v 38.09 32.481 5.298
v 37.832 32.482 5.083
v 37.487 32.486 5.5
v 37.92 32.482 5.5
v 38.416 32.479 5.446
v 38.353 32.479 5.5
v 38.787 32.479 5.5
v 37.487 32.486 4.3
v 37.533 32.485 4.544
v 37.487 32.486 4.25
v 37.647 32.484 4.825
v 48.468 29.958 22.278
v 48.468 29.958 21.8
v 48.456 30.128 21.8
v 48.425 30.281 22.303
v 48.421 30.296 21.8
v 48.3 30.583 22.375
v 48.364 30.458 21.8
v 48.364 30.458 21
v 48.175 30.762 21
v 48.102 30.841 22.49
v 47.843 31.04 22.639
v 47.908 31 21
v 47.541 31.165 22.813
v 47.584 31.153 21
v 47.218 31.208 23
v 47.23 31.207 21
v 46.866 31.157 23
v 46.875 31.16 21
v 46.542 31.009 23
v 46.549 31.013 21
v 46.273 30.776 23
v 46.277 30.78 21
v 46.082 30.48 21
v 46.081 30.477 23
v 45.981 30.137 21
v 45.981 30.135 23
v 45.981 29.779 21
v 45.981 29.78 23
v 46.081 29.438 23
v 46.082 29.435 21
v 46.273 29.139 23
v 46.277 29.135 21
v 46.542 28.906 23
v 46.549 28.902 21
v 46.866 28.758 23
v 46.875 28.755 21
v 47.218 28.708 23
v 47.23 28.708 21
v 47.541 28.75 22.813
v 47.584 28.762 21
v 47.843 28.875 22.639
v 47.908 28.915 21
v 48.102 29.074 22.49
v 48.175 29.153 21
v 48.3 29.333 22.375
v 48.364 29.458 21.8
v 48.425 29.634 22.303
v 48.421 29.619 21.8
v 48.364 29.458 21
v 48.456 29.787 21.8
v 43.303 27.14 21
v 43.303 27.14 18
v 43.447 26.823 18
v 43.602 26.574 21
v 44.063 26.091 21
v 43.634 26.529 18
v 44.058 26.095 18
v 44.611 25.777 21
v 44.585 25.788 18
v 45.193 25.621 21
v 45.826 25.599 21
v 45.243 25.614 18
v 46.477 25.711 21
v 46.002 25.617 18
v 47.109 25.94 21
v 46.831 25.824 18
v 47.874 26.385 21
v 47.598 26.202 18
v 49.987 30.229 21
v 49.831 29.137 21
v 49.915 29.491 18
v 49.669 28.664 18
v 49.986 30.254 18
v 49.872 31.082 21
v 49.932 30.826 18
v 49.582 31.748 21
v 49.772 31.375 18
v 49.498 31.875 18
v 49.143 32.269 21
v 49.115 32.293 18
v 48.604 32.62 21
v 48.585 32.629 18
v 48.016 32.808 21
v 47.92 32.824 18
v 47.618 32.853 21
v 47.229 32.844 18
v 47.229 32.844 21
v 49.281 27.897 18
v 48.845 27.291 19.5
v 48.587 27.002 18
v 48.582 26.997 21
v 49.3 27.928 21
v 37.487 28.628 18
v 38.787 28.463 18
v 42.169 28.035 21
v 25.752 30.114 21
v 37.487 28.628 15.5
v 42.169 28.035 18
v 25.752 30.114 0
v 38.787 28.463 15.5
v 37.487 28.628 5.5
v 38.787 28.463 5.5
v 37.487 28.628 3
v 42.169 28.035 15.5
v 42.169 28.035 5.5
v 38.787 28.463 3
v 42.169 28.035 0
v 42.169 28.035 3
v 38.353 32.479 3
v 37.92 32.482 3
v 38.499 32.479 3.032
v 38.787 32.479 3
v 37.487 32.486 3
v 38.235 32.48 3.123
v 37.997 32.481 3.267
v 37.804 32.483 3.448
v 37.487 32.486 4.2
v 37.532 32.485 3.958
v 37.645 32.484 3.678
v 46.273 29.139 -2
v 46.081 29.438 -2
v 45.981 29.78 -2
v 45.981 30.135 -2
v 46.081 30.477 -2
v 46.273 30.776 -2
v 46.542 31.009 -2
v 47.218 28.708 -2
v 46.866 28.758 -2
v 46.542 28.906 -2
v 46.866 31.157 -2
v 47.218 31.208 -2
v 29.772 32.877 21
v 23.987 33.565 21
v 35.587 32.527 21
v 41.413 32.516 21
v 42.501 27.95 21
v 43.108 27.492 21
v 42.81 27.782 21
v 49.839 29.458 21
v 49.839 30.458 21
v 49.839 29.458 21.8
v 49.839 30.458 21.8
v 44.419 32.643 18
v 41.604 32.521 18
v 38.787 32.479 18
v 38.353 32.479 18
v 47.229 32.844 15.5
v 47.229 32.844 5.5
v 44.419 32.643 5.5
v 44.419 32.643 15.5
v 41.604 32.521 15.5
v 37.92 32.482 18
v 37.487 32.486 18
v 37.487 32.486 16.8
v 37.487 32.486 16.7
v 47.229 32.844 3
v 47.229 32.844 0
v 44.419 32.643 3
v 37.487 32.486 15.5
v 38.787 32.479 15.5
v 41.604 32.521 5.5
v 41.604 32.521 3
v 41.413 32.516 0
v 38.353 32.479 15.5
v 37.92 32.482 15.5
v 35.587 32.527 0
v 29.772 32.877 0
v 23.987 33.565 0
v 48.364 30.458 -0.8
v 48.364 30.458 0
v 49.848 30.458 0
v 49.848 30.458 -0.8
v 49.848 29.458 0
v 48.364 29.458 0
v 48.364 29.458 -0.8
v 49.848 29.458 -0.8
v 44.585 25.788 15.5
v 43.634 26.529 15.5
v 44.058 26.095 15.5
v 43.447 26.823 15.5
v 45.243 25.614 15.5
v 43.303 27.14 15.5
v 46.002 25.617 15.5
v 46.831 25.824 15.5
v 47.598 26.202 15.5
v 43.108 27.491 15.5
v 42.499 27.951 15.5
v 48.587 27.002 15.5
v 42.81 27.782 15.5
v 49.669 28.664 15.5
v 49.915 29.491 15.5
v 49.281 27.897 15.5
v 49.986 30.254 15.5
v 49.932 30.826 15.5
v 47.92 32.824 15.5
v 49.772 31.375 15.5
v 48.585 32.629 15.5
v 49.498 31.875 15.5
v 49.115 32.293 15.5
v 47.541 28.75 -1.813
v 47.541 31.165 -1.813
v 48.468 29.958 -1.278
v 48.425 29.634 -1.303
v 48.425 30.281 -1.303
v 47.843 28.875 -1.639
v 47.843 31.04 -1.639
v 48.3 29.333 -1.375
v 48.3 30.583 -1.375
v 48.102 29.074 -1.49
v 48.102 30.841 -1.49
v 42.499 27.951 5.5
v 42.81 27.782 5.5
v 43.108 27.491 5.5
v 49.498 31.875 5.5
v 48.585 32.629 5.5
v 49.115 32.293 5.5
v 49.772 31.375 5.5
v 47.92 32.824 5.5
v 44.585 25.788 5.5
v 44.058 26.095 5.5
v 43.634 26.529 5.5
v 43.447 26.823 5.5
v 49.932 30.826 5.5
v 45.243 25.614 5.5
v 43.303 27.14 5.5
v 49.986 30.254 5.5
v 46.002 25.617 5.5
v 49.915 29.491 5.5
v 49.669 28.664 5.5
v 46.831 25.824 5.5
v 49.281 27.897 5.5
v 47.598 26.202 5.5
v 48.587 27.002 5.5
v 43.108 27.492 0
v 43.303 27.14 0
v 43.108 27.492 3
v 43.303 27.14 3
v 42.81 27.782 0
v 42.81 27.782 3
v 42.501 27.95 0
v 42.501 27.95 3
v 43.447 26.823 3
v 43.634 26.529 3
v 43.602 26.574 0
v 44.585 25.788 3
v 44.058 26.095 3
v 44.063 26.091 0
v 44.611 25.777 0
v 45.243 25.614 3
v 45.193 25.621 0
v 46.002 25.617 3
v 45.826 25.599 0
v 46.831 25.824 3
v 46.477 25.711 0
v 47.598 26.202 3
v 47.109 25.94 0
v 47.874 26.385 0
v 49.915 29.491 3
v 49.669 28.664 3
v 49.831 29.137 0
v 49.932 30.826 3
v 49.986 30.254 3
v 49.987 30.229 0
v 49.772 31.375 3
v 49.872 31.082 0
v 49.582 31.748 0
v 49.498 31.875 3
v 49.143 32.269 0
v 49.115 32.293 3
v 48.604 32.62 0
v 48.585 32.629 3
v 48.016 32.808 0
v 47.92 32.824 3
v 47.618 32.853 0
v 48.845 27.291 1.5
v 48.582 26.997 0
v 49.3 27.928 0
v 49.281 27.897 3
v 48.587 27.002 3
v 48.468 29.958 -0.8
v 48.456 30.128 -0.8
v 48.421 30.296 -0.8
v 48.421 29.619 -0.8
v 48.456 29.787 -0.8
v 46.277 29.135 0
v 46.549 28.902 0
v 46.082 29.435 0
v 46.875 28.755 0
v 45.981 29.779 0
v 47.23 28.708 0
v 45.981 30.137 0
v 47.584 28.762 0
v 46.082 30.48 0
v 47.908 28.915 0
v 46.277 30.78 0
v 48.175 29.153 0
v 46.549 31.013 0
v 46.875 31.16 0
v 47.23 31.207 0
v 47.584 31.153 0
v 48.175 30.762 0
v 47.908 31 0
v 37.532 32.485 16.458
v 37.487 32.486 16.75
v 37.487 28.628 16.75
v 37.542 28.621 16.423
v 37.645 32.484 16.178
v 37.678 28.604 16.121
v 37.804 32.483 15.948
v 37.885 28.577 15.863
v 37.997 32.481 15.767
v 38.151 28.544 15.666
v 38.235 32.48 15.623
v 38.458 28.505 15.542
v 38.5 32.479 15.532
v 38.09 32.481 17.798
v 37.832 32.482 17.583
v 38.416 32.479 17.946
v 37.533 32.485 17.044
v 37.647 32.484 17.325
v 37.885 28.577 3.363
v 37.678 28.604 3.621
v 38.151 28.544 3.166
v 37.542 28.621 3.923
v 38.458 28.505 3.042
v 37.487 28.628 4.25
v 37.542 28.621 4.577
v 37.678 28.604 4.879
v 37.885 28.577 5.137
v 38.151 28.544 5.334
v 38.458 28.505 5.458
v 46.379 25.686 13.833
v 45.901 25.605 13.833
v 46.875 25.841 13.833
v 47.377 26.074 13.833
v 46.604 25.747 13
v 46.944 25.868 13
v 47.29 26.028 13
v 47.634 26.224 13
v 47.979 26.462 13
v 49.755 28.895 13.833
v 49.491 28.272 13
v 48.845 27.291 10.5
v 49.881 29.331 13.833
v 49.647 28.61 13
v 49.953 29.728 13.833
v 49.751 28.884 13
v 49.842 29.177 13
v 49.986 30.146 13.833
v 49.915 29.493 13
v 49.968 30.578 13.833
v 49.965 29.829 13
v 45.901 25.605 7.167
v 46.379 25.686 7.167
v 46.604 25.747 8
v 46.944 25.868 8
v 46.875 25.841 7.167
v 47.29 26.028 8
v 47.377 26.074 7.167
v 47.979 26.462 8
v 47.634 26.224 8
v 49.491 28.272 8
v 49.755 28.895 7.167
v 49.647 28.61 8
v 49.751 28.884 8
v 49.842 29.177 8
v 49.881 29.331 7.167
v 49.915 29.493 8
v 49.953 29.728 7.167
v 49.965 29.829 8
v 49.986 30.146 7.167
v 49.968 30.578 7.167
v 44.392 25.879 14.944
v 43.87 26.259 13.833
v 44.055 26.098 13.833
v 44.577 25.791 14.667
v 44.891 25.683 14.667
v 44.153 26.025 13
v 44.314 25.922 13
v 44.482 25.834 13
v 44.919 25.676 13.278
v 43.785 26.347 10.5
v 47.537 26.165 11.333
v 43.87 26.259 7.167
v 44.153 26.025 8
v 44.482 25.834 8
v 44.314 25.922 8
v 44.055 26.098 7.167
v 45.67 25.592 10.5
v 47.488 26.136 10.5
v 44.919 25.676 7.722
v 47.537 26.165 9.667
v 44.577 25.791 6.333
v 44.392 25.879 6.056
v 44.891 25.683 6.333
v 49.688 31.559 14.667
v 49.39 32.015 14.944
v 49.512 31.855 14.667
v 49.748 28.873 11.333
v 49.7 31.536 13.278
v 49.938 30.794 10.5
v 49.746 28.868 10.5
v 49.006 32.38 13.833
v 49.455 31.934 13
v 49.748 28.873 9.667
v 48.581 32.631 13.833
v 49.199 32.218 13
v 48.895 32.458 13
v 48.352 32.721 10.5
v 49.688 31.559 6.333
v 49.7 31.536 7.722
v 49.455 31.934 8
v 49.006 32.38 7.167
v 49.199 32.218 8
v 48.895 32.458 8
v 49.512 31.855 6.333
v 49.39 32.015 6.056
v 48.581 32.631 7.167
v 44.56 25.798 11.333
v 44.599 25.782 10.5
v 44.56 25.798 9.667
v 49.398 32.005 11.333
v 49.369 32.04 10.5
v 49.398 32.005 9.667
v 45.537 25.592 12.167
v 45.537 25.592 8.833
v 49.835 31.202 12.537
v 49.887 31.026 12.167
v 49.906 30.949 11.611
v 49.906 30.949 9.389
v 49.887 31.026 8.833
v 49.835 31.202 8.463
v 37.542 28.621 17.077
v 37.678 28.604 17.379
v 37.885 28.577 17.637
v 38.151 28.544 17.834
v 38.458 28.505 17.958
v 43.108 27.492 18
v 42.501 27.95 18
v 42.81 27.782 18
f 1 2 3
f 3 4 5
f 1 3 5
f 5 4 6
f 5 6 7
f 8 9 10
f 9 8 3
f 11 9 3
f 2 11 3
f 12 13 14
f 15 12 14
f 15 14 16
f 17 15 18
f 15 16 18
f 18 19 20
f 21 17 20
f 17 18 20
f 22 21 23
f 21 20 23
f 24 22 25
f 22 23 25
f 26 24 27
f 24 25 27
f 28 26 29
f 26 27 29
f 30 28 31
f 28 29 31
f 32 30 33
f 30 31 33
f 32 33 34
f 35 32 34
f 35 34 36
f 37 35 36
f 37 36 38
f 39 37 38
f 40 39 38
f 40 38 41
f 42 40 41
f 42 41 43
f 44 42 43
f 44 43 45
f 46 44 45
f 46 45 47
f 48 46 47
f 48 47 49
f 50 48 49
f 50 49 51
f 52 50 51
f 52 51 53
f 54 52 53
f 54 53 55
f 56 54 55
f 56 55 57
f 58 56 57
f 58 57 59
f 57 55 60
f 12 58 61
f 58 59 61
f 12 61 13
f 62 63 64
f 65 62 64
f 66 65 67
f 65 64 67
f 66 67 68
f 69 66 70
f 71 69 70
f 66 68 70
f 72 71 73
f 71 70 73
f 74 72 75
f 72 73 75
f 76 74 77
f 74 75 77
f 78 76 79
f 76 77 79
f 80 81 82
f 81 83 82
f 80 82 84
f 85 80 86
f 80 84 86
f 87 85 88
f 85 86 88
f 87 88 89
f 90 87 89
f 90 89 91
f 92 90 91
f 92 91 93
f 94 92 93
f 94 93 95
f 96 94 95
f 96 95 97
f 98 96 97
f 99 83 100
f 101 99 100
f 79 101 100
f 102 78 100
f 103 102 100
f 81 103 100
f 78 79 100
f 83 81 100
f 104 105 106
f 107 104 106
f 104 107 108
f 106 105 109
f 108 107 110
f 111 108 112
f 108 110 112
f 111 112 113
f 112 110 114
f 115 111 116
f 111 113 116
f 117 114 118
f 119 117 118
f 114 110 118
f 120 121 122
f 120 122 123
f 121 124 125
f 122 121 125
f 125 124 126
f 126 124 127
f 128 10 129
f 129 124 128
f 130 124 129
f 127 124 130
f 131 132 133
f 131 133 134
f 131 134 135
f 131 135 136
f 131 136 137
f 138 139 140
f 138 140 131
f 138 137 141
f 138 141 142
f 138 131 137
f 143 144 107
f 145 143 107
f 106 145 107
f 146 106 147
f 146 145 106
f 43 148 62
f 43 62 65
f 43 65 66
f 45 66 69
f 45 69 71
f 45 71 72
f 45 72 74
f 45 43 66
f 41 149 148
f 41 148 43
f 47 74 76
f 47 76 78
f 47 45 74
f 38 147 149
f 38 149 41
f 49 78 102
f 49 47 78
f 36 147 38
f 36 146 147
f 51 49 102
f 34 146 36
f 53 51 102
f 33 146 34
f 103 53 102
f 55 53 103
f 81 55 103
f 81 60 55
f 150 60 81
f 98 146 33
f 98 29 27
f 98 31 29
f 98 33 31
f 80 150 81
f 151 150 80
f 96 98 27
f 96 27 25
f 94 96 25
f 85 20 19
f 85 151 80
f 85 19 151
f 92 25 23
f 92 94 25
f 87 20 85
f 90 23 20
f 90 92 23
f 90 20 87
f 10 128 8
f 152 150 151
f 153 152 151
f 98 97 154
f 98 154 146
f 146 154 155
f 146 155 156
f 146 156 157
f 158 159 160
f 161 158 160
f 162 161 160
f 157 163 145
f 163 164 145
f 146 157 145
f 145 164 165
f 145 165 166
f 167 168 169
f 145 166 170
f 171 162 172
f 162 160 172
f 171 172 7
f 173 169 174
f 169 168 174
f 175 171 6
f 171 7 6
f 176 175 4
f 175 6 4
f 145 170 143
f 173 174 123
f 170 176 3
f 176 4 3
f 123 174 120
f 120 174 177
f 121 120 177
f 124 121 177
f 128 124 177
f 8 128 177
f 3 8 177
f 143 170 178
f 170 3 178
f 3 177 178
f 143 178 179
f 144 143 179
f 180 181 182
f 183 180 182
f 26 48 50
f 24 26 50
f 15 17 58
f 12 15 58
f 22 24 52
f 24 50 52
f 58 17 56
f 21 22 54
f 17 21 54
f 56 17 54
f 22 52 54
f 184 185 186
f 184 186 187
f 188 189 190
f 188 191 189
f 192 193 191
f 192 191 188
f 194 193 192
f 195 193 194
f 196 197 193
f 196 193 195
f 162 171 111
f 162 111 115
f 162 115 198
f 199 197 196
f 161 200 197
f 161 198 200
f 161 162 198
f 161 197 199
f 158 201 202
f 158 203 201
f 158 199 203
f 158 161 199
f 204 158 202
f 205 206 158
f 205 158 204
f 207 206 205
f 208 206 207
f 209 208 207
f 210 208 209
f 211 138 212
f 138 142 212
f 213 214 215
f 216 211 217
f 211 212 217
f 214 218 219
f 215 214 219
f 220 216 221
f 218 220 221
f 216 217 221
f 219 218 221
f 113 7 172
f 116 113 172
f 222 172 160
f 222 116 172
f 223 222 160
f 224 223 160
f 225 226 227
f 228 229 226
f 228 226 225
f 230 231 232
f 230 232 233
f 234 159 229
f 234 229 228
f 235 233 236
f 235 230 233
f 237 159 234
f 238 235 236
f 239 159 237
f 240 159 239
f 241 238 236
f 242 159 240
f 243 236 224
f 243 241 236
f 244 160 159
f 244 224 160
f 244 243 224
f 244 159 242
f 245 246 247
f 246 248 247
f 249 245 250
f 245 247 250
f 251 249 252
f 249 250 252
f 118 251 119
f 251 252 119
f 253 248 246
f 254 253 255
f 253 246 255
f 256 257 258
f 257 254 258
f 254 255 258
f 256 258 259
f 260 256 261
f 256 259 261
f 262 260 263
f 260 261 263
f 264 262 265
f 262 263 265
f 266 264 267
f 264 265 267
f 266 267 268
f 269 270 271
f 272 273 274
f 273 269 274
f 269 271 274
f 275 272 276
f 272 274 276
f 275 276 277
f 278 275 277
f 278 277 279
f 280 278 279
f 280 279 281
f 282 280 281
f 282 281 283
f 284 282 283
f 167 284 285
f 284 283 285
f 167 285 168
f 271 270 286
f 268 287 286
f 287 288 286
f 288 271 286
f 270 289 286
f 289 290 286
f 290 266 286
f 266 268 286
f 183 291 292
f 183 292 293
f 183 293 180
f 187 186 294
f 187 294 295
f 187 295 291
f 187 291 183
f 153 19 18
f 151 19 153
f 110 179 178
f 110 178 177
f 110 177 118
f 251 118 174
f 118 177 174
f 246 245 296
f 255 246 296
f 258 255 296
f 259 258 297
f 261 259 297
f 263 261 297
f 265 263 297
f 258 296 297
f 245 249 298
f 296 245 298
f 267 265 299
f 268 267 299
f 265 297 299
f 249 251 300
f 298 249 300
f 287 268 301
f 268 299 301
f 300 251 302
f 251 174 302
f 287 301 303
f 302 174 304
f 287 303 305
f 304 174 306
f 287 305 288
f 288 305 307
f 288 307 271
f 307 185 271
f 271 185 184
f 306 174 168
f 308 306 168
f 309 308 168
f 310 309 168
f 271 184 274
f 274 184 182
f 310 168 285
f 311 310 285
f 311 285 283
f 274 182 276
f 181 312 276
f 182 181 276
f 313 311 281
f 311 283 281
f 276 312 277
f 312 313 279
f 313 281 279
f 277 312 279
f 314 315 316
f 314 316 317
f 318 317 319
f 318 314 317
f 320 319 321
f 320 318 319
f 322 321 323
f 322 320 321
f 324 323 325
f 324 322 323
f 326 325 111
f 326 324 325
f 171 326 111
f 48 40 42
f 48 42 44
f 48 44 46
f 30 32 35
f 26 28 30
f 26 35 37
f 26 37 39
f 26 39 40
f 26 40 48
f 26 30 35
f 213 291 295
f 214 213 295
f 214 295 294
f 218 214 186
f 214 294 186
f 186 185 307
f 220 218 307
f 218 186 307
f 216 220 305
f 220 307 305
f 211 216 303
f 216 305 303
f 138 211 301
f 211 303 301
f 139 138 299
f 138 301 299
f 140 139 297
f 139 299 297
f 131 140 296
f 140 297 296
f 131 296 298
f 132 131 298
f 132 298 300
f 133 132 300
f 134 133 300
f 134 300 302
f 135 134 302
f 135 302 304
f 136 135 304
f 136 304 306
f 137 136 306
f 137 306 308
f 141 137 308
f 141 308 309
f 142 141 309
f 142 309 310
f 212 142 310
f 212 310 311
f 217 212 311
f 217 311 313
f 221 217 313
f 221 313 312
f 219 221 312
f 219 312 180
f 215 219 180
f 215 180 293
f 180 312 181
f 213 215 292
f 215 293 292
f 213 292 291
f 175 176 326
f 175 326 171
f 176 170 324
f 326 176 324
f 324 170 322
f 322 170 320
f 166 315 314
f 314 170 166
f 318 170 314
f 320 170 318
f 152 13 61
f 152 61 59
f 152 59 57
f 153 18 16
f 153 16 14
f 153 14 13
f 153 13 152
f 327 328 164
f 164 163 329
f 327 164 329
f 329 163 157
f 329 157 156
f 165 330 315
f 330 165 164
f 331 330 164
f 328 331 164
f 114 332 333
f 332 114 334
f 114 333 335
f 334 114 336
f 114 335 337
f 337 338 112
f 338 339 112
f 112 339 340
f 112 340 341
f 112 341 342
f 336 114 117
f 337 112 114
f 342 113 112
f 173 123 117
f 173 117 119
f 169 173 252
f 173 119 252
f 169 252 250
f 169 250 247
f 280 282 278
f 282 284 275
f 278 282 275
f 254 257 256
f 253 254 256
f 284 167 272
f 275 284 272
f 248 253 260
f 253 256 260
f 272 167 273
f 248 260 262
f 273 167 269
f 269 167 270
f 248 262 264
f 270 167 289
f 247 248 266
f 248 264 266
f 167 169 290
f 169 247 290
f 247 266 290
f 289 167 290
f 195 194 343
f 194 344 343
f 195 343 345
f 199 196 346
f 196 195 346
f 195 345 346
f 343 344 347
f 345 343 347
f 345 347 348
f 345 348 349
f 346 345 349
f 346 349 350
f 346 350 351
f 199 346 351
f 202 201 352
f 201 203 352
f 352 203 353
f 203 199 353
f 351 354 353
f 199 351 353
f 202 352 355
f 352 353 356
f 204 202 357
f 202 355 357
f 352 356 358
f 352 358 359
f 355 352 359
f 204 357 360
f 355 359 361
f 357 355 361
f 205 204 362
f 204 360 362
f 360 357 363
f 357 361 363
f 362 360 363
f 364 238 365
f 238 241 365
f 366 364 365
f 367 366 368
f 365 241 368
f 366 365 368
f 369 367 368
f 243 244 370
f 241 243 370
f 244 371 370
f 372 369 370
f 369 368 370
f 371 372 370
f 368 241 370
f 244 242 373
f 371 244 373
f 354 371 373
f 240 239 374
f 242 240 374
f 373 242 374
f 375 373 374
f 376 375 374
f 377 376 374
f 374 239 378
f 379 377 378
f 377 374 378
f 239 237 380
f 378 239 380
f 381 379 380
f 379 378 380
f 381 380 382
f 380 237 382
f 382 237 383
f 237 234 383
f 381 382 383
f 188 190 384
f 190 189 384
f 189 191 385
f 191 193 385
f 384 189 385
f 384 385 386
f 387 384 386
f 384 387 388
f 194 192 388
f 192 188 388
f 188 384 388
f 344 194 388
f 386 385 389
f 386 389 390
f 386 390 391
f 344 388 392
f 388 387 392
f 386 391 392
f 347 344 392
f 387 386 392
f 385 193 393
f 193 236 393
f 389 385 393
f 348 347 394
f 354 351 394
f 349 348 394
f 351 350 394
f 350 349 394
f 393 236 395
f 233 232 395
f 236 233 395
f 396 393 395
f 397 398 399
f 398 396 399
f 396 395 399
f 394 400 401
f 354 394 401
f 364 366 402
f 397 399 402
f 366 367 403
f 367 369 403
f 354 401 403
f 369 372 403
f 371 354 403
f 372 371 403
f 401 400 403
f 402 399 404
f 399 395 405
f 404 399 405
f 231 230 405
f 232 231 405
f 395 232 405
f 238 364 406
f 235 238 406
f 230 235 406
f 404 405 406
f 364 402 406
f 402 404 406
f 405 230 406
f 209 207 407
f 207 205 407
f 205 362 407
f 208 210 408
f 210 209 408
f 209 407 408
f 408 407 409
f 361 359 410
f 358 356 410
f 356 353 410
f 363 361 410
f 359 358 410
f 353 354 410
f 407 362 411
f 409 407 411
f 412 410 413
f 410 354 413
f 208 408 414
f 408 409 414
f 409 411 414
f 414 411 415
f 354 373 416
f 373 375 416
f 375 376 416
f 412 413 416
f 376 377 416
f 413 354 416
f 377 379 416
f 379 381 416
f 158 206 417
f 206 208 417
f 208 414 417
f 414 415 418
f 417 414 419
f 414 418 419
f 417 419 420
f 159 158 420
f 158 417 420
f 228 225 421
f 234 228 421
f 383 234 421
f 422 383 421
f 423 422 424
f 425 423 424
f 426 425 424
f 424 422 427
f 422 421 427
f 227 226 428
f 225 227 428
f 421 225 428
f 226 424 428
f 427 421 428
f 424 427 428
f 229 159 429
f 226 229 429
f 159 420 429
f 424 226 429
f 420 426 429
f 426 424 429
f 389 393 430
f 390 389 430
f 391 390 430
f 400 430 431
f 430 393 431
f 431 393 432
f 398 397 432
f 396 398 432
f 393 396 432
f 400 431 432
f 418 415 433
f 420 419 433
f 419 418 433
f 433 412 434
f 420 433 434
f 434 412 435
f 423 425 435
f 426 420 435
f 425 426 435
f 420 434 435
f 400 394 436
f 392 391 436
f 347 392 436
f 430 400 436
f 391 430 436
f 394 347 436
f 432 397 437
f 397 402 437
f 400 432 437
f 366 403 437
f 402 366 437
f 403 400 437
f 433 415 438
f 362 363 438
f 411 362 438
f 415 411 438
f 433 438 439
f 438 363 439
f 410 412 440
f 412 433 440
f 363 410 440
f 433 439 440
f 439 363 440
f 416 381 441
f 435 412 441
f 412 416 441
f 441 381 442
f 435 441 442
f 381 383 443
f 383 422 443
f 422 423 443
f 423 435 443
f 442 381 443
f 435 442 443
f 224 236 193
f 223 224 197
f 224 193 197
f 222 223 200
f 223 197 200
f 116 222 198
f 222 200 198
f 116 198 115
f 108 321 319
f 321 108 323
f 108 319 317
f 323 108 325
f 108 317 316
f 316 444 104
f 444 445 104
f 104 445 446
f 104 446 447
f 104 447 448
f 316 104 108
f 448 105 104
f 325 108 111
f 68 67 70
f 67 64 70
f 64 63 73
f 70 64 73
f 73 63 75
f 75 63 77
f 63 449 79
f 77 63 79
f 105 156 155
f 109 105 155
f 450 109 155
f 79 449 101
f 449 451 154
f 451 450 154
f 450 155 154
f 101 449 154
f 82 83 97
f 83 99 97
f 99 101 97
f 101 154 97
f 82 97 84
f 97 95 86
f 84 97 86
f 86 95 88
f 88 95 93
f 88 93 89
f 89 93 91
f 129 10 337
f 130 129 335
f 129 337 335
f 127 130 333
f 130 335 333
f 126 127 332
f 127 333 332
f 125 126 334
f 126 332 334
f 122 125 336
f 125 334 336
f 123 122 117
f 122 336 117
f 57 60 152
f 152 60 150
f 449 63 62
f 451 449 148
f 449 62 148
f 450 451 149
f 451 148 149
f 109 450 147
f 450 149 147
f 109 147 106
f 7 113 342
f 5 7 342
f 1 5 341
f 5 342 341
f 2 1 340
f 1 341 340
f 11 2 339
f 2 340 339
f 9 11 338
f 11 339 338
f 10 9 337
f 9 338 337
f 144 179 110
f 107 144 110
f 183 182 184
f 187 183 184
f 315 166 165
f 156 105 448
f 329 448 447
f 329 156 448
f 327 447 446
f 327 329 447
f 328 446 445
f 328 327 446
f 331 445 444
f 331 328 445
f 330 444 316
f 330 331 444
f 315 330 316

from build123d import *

# Parameters (mm, degrees)
F1_DEPTH     = 21
F3_W         = 15.0982862345
F3_H         = 25.1671721393
F4_DEPTH     = 2.5
F6_W         = 27.927816356
F6_H         = 22.3754025899
F7_DEPTH     = 2.5
F8_T4_DEPTH  = 10.3582394023
F8_S5_R      = 100
F8_T6_DEPTH  = 7
F8_T11_DEPTH = 10.3582394023
F8_S12_R     = 100
F8_T13_DEPTH = 7
F8_T18_DEPTH = 10.3582394023
F8_S19_R     = 100
F8_T20_DEPTH = 7
F8_T25_DEPTH = 10.3582394023
F8_S26_R     = 100
F8_T27_DEPTH = 7
F9_R         = 1.4
F10_R        = 1.25
F11_DEPTH    = 2
F13_R        = 1.25
F14_DEPTH    = 2
F17_W        = 1.492921263
F17_H        = 4.4254288077
F18_DEPTH    = 25
F21_W        = 1.9132951934
F21_H        = 3.2676104456
F22_DEPTH    = 25
F23_W        = 2.6214234531
F23_H        = 1
F24_DEPTH    = 0.8
F25_W        = 2.6302933693
F25_H        = 1
F26_DEPTH    = 0.8


# Not quite as in the source:
# - a fillet or chamfer that OpenCascade refuses, or shapes differently, is made with other operations: its cross-section is extruded or revolved along the edge and cut away or added


with BuildPart() as f1:
    # F0 (on Top) → F1 (new body)
    with BuildSketch(Plane.XY):
        with BuildLine():
            Line((25.7519837469, 30.1143433899), (43.1284420192, 27.9130078852))
            add(Edge.make_bspline(
                [(43.1284420192, 27.9130078852), (43.748237159, 21.1619048692), (48.845124386, 27.2907595332), (53.9420116129, 33.4196141972), (47.2293113268, 32.8441807488)],
                knots=[2.4902540559, 2.4902540559, 2.4902540559, 4.7016901225, 4.7016901225, 6.9131261892, 6.9131261892, 6.9131261892], degree=2, weights=[1, 0.4484927805, 1, 0.4484927805, 1]))
            ThreePointArc((47.2293113268, 32.8441807488), (35.5868846063, 32.5268772196), (23.9865279377, 33.5653889592))
            Line((23.9865279377, 33.5653889592), (25.7519837469, 30.1143433899))
        make_face()
    extrude(amount=F1_DEPTH)

    # F3 (on offset) → F4 (cut)
    with BuildSketch(Plane.XY.offset(18)):
        with Locations((45.0356710549, 29.340852052)):
            Rectangle(F3_W, F3_H)
    extrude(amount=-F4_DEPTH, mode=Mode.SUBTRACT)

    # F6 (on offset) → F7 (cut)
    with BuildSketch(Plane(origin=(0, 0, 3), x_dir=(1, 0, 0), z_dir=(0, 0, -1))):
        with Locations((51.4504361157, -29.4867381454)):
            Rectangle(F6_W, F6_H)
    extrude(amount=-F7_DEPTH, mode=Mode.SUBTRACT)

    # F8: fillet of radius 1.3 on 4 edges, made by hand


with BuildPart() as f8_tool2:
    # F8_s3 → F8_t4 (new body)
    with BuildSketch(Plane.XZ.offset(-25.3777534097)):
        with BuildLine():
            ThreePointArc((38.7865279377, 5.5), (37.8672891221, 5.1192388155), (37.4865279377, 4.2))
            Line((37.4865279377, 4.2), (37.4865279377, 5.5))
            Line((37.4865279377, 5.5), (38.7865279377, 5.5))
        make_face()
    extrude(amount=-F8_T4_DEPTH)

    # F8_s5 → F8_t6 (cut, symmetric)
    with BuildSketch(Plane.XY.offset(4.8)):
        with Locations((38.6883258238, 132.4787709604)):
            Circle(F8_S5_R)
    extrude(amount=F8_T6_DEPTH, both=True, mode=Mode.SUBTRACT)

    split(bisect_by=Plane(origin=(4.1615402697, 32.8495273406, 0), x_dir=(0, 0, 1), z_dir=(0.1256804232, 0.9920707793, 0)), keep=Keep.TOP)


with BuildPart() as f1_1:
    add(f1.part)

    # F8_t1: union F8_tool2
    add(f8_tool2.part)


with BuildPart() as f8_tool9:
    # F8_s10 → F8_t11 (new body)
    with BuildSketch(Plane.XZ.offset(-35.735992812)):
        with BuildLine():
            ThreePointArc((38.7865279377, 18), (37.8672891221, 17.6192388155), (37.4865279377, 16.7))
            Line((37.4865279377, 16.7), (37.4865279377, 18))
            Line((37.4865279377, 18), (38.7865279377, 18))
        make_face()
    extrude(amount=F8_T11_DEPTH)

    # F8_s12 → F8_t13 (cut, symmetric)
    with BuildSketch(Plane.XY.offset(17.4)):
        with Locations((38.6883258238, 132.4787709604)):
            Circle(F8_S12_R)
    extrude(amount=F8_T13_DEPTH, both=True, mode=Mode.SUBTRACT)

    split(bisect_by=Plane(origin=(4.1615402697, 32.8495273406, 0), x_dir=(0, 0, 1), z_dir=(0.1256804232, 0.9920707793, 0)), keep=Keep.TOP)


with BuildPart() as f1_2:
    add(f1_1.part)

    # F8_t8: union F8_tool9
    add(f8_tool9.part)


with BuildPart() as f8_tool16:
    # F8_s17 → F8_t18 (new body)
    with BuildSketch(Plane.XZ.offset(-25.3777534097)):
        with BuildLine():
            ThreePointArc((37.4865279377, 4.3), (37.8672891221, 3.3807611845), (38.7865279377, 3))
            Line((38.7865279377, 3), (37.4865279377, 3))
            Line((37.4865279377, 3), (37.4865279377, 4.3))
        make_face()
    extrude(amount=-F8_T18_DEPTH)

    # F8_s19 → F8_t20 (cut, symmetric)
    with BuildSketch(Plane.XY.offset(3.7)):
        with Locations((38.6883258238, 132.4787709604)):
            Circle(F8_S19_R)
    extrude(amount=F8_T20_DEPTH, both=True, mode=Mode.SUBTRACT)

    split(bisect_by=Plane(origin=(4.1615402697, 32.8495273406, 0), x_dir=(0, 0, 1), z_dir=(0.1256804232, 0.9920707793, 0)), keep=Keep.TOP)


with BuildPart() as f1_3:
    add(f1_2.part)

    # F8_t15: union F8_tool16
    add(f8_tool16.part)


with BuildPart() as f8_tool23:
    # F8_s24 → F8_t25 (new body)
    with BuildSketch(Plane.XZ.offset(-35.735992812)):
        with BuildLine():
            ThreePointArc((37.4865279377, 16.8), (37.8672891221, 15.8807611845), (38.7865279377, 15.5))
            Line((38.7865279377, 15.5), (37.4865279377, 15.5))
            Line((37.4865279377, 15.5), (37.4865279377, 16.8))
        make_face()
    extrude(amount=F8_T25_DEPTH)

    # F8_s26 → F8_t27 (cut, symmetric)
    with BuildSketch(Plane.XY.offset(16.2)):
        with Locations((38.6883258238, 132.4787709604)):
            Circle(F8_S26_R)
    extrude(amount=F8_T27_DEPTH, both=True, mode=Mode.SUBTRACT)

    split(bisect_by=Plane(origin=(4.1615402697, 32.8495273406, 0), x_dir=(0, 0, 1), z_dir=(0.1256804232, 0.9920707793, 0)), keep=Keep.TOP)


with BuildPart() as f1_4:
    add(f1_3.part)

    # F8_t22: union F8_tool23
    add(f8_tool23.part)

    # F9
    f9_edges = [f1_4.edges().sort_by_distance(p)[0] for p in [
        (43.128442, 27.913008, 19.5),
        (43.128442, 27.913008, 10.5),
        (43.128442, 27.913008, 1.5),
    ]]
    fillet(f9_edges, radius=F9_R)

    # F10 (on face) → F11 (join)
    with BuildSketch(Plane.XY.offset(21)):
        with Locations((47.2179576755, 29.9575272948)):
            Circle(F10_R)
    extrude(amount=F11_DEPTH)

    # F13 (on face) → F14 (join)
    with BuildSketch(Plane(origin=(0, 0, 0), x_dir=(1, 0, 0), z_dir=(0, 0, -1))):
        with Locations((47.2179576755, -29.9575272948)):
            Circle(F13_R)
    extrude(amount=F14_DEPTH)

    # F17 (on line) → F18 (cut)
    with BuildSketch(Plane(origin=(12.6705148226, 0, -21.9459754309), x_dir=(0.8660254038, 0, 0.5), z_dir=(-0.5, 0, 0.8660254038))):
        with Locations((40.6311545521, 30.2472934127)):
            Rectangle(F17_W, F17_H)
    extrude(amount=-F18_DEPTH, mode=Mode.SUBTRACT)

    # F21 (on line) → F22 (cut)
    with BuildSketch(Plane(origin=(21.7637815624, 0, 37.6959754309), x_dir=(0.8660254038, 0, -0.5), z_dir=(-0.5, 0, -0.8660254038))):
        with Locations((30.3485984584, -30.0394026563)):
            Rectangle(F21_W, F21_H)
    extrude(amount=-F22_DEPTH, mode=Mode.SUBTRACT)

    # F23 (on face) → F24 (join)
    with BuildSketch(Plane.XY.offset(21)):
        with Locations((48.528669402, 29.9575272948)):
            Rectangle(F23_W, F23_H)
    extrude(amount=F24_DEPTH)

    # F25 (on face) → F26 (join)
    with BuildSketch(Plane(origin=(0, 0, 0), x_dir=(1, 0, 0), z_dir=(0, 0, -1))):
        with Locations((48.5331043601, -29.9575272948)):
            Rectangle(F25_W, F25_H)
    extrude(amount=F26_DEPTH)


solid = f1_4.part
